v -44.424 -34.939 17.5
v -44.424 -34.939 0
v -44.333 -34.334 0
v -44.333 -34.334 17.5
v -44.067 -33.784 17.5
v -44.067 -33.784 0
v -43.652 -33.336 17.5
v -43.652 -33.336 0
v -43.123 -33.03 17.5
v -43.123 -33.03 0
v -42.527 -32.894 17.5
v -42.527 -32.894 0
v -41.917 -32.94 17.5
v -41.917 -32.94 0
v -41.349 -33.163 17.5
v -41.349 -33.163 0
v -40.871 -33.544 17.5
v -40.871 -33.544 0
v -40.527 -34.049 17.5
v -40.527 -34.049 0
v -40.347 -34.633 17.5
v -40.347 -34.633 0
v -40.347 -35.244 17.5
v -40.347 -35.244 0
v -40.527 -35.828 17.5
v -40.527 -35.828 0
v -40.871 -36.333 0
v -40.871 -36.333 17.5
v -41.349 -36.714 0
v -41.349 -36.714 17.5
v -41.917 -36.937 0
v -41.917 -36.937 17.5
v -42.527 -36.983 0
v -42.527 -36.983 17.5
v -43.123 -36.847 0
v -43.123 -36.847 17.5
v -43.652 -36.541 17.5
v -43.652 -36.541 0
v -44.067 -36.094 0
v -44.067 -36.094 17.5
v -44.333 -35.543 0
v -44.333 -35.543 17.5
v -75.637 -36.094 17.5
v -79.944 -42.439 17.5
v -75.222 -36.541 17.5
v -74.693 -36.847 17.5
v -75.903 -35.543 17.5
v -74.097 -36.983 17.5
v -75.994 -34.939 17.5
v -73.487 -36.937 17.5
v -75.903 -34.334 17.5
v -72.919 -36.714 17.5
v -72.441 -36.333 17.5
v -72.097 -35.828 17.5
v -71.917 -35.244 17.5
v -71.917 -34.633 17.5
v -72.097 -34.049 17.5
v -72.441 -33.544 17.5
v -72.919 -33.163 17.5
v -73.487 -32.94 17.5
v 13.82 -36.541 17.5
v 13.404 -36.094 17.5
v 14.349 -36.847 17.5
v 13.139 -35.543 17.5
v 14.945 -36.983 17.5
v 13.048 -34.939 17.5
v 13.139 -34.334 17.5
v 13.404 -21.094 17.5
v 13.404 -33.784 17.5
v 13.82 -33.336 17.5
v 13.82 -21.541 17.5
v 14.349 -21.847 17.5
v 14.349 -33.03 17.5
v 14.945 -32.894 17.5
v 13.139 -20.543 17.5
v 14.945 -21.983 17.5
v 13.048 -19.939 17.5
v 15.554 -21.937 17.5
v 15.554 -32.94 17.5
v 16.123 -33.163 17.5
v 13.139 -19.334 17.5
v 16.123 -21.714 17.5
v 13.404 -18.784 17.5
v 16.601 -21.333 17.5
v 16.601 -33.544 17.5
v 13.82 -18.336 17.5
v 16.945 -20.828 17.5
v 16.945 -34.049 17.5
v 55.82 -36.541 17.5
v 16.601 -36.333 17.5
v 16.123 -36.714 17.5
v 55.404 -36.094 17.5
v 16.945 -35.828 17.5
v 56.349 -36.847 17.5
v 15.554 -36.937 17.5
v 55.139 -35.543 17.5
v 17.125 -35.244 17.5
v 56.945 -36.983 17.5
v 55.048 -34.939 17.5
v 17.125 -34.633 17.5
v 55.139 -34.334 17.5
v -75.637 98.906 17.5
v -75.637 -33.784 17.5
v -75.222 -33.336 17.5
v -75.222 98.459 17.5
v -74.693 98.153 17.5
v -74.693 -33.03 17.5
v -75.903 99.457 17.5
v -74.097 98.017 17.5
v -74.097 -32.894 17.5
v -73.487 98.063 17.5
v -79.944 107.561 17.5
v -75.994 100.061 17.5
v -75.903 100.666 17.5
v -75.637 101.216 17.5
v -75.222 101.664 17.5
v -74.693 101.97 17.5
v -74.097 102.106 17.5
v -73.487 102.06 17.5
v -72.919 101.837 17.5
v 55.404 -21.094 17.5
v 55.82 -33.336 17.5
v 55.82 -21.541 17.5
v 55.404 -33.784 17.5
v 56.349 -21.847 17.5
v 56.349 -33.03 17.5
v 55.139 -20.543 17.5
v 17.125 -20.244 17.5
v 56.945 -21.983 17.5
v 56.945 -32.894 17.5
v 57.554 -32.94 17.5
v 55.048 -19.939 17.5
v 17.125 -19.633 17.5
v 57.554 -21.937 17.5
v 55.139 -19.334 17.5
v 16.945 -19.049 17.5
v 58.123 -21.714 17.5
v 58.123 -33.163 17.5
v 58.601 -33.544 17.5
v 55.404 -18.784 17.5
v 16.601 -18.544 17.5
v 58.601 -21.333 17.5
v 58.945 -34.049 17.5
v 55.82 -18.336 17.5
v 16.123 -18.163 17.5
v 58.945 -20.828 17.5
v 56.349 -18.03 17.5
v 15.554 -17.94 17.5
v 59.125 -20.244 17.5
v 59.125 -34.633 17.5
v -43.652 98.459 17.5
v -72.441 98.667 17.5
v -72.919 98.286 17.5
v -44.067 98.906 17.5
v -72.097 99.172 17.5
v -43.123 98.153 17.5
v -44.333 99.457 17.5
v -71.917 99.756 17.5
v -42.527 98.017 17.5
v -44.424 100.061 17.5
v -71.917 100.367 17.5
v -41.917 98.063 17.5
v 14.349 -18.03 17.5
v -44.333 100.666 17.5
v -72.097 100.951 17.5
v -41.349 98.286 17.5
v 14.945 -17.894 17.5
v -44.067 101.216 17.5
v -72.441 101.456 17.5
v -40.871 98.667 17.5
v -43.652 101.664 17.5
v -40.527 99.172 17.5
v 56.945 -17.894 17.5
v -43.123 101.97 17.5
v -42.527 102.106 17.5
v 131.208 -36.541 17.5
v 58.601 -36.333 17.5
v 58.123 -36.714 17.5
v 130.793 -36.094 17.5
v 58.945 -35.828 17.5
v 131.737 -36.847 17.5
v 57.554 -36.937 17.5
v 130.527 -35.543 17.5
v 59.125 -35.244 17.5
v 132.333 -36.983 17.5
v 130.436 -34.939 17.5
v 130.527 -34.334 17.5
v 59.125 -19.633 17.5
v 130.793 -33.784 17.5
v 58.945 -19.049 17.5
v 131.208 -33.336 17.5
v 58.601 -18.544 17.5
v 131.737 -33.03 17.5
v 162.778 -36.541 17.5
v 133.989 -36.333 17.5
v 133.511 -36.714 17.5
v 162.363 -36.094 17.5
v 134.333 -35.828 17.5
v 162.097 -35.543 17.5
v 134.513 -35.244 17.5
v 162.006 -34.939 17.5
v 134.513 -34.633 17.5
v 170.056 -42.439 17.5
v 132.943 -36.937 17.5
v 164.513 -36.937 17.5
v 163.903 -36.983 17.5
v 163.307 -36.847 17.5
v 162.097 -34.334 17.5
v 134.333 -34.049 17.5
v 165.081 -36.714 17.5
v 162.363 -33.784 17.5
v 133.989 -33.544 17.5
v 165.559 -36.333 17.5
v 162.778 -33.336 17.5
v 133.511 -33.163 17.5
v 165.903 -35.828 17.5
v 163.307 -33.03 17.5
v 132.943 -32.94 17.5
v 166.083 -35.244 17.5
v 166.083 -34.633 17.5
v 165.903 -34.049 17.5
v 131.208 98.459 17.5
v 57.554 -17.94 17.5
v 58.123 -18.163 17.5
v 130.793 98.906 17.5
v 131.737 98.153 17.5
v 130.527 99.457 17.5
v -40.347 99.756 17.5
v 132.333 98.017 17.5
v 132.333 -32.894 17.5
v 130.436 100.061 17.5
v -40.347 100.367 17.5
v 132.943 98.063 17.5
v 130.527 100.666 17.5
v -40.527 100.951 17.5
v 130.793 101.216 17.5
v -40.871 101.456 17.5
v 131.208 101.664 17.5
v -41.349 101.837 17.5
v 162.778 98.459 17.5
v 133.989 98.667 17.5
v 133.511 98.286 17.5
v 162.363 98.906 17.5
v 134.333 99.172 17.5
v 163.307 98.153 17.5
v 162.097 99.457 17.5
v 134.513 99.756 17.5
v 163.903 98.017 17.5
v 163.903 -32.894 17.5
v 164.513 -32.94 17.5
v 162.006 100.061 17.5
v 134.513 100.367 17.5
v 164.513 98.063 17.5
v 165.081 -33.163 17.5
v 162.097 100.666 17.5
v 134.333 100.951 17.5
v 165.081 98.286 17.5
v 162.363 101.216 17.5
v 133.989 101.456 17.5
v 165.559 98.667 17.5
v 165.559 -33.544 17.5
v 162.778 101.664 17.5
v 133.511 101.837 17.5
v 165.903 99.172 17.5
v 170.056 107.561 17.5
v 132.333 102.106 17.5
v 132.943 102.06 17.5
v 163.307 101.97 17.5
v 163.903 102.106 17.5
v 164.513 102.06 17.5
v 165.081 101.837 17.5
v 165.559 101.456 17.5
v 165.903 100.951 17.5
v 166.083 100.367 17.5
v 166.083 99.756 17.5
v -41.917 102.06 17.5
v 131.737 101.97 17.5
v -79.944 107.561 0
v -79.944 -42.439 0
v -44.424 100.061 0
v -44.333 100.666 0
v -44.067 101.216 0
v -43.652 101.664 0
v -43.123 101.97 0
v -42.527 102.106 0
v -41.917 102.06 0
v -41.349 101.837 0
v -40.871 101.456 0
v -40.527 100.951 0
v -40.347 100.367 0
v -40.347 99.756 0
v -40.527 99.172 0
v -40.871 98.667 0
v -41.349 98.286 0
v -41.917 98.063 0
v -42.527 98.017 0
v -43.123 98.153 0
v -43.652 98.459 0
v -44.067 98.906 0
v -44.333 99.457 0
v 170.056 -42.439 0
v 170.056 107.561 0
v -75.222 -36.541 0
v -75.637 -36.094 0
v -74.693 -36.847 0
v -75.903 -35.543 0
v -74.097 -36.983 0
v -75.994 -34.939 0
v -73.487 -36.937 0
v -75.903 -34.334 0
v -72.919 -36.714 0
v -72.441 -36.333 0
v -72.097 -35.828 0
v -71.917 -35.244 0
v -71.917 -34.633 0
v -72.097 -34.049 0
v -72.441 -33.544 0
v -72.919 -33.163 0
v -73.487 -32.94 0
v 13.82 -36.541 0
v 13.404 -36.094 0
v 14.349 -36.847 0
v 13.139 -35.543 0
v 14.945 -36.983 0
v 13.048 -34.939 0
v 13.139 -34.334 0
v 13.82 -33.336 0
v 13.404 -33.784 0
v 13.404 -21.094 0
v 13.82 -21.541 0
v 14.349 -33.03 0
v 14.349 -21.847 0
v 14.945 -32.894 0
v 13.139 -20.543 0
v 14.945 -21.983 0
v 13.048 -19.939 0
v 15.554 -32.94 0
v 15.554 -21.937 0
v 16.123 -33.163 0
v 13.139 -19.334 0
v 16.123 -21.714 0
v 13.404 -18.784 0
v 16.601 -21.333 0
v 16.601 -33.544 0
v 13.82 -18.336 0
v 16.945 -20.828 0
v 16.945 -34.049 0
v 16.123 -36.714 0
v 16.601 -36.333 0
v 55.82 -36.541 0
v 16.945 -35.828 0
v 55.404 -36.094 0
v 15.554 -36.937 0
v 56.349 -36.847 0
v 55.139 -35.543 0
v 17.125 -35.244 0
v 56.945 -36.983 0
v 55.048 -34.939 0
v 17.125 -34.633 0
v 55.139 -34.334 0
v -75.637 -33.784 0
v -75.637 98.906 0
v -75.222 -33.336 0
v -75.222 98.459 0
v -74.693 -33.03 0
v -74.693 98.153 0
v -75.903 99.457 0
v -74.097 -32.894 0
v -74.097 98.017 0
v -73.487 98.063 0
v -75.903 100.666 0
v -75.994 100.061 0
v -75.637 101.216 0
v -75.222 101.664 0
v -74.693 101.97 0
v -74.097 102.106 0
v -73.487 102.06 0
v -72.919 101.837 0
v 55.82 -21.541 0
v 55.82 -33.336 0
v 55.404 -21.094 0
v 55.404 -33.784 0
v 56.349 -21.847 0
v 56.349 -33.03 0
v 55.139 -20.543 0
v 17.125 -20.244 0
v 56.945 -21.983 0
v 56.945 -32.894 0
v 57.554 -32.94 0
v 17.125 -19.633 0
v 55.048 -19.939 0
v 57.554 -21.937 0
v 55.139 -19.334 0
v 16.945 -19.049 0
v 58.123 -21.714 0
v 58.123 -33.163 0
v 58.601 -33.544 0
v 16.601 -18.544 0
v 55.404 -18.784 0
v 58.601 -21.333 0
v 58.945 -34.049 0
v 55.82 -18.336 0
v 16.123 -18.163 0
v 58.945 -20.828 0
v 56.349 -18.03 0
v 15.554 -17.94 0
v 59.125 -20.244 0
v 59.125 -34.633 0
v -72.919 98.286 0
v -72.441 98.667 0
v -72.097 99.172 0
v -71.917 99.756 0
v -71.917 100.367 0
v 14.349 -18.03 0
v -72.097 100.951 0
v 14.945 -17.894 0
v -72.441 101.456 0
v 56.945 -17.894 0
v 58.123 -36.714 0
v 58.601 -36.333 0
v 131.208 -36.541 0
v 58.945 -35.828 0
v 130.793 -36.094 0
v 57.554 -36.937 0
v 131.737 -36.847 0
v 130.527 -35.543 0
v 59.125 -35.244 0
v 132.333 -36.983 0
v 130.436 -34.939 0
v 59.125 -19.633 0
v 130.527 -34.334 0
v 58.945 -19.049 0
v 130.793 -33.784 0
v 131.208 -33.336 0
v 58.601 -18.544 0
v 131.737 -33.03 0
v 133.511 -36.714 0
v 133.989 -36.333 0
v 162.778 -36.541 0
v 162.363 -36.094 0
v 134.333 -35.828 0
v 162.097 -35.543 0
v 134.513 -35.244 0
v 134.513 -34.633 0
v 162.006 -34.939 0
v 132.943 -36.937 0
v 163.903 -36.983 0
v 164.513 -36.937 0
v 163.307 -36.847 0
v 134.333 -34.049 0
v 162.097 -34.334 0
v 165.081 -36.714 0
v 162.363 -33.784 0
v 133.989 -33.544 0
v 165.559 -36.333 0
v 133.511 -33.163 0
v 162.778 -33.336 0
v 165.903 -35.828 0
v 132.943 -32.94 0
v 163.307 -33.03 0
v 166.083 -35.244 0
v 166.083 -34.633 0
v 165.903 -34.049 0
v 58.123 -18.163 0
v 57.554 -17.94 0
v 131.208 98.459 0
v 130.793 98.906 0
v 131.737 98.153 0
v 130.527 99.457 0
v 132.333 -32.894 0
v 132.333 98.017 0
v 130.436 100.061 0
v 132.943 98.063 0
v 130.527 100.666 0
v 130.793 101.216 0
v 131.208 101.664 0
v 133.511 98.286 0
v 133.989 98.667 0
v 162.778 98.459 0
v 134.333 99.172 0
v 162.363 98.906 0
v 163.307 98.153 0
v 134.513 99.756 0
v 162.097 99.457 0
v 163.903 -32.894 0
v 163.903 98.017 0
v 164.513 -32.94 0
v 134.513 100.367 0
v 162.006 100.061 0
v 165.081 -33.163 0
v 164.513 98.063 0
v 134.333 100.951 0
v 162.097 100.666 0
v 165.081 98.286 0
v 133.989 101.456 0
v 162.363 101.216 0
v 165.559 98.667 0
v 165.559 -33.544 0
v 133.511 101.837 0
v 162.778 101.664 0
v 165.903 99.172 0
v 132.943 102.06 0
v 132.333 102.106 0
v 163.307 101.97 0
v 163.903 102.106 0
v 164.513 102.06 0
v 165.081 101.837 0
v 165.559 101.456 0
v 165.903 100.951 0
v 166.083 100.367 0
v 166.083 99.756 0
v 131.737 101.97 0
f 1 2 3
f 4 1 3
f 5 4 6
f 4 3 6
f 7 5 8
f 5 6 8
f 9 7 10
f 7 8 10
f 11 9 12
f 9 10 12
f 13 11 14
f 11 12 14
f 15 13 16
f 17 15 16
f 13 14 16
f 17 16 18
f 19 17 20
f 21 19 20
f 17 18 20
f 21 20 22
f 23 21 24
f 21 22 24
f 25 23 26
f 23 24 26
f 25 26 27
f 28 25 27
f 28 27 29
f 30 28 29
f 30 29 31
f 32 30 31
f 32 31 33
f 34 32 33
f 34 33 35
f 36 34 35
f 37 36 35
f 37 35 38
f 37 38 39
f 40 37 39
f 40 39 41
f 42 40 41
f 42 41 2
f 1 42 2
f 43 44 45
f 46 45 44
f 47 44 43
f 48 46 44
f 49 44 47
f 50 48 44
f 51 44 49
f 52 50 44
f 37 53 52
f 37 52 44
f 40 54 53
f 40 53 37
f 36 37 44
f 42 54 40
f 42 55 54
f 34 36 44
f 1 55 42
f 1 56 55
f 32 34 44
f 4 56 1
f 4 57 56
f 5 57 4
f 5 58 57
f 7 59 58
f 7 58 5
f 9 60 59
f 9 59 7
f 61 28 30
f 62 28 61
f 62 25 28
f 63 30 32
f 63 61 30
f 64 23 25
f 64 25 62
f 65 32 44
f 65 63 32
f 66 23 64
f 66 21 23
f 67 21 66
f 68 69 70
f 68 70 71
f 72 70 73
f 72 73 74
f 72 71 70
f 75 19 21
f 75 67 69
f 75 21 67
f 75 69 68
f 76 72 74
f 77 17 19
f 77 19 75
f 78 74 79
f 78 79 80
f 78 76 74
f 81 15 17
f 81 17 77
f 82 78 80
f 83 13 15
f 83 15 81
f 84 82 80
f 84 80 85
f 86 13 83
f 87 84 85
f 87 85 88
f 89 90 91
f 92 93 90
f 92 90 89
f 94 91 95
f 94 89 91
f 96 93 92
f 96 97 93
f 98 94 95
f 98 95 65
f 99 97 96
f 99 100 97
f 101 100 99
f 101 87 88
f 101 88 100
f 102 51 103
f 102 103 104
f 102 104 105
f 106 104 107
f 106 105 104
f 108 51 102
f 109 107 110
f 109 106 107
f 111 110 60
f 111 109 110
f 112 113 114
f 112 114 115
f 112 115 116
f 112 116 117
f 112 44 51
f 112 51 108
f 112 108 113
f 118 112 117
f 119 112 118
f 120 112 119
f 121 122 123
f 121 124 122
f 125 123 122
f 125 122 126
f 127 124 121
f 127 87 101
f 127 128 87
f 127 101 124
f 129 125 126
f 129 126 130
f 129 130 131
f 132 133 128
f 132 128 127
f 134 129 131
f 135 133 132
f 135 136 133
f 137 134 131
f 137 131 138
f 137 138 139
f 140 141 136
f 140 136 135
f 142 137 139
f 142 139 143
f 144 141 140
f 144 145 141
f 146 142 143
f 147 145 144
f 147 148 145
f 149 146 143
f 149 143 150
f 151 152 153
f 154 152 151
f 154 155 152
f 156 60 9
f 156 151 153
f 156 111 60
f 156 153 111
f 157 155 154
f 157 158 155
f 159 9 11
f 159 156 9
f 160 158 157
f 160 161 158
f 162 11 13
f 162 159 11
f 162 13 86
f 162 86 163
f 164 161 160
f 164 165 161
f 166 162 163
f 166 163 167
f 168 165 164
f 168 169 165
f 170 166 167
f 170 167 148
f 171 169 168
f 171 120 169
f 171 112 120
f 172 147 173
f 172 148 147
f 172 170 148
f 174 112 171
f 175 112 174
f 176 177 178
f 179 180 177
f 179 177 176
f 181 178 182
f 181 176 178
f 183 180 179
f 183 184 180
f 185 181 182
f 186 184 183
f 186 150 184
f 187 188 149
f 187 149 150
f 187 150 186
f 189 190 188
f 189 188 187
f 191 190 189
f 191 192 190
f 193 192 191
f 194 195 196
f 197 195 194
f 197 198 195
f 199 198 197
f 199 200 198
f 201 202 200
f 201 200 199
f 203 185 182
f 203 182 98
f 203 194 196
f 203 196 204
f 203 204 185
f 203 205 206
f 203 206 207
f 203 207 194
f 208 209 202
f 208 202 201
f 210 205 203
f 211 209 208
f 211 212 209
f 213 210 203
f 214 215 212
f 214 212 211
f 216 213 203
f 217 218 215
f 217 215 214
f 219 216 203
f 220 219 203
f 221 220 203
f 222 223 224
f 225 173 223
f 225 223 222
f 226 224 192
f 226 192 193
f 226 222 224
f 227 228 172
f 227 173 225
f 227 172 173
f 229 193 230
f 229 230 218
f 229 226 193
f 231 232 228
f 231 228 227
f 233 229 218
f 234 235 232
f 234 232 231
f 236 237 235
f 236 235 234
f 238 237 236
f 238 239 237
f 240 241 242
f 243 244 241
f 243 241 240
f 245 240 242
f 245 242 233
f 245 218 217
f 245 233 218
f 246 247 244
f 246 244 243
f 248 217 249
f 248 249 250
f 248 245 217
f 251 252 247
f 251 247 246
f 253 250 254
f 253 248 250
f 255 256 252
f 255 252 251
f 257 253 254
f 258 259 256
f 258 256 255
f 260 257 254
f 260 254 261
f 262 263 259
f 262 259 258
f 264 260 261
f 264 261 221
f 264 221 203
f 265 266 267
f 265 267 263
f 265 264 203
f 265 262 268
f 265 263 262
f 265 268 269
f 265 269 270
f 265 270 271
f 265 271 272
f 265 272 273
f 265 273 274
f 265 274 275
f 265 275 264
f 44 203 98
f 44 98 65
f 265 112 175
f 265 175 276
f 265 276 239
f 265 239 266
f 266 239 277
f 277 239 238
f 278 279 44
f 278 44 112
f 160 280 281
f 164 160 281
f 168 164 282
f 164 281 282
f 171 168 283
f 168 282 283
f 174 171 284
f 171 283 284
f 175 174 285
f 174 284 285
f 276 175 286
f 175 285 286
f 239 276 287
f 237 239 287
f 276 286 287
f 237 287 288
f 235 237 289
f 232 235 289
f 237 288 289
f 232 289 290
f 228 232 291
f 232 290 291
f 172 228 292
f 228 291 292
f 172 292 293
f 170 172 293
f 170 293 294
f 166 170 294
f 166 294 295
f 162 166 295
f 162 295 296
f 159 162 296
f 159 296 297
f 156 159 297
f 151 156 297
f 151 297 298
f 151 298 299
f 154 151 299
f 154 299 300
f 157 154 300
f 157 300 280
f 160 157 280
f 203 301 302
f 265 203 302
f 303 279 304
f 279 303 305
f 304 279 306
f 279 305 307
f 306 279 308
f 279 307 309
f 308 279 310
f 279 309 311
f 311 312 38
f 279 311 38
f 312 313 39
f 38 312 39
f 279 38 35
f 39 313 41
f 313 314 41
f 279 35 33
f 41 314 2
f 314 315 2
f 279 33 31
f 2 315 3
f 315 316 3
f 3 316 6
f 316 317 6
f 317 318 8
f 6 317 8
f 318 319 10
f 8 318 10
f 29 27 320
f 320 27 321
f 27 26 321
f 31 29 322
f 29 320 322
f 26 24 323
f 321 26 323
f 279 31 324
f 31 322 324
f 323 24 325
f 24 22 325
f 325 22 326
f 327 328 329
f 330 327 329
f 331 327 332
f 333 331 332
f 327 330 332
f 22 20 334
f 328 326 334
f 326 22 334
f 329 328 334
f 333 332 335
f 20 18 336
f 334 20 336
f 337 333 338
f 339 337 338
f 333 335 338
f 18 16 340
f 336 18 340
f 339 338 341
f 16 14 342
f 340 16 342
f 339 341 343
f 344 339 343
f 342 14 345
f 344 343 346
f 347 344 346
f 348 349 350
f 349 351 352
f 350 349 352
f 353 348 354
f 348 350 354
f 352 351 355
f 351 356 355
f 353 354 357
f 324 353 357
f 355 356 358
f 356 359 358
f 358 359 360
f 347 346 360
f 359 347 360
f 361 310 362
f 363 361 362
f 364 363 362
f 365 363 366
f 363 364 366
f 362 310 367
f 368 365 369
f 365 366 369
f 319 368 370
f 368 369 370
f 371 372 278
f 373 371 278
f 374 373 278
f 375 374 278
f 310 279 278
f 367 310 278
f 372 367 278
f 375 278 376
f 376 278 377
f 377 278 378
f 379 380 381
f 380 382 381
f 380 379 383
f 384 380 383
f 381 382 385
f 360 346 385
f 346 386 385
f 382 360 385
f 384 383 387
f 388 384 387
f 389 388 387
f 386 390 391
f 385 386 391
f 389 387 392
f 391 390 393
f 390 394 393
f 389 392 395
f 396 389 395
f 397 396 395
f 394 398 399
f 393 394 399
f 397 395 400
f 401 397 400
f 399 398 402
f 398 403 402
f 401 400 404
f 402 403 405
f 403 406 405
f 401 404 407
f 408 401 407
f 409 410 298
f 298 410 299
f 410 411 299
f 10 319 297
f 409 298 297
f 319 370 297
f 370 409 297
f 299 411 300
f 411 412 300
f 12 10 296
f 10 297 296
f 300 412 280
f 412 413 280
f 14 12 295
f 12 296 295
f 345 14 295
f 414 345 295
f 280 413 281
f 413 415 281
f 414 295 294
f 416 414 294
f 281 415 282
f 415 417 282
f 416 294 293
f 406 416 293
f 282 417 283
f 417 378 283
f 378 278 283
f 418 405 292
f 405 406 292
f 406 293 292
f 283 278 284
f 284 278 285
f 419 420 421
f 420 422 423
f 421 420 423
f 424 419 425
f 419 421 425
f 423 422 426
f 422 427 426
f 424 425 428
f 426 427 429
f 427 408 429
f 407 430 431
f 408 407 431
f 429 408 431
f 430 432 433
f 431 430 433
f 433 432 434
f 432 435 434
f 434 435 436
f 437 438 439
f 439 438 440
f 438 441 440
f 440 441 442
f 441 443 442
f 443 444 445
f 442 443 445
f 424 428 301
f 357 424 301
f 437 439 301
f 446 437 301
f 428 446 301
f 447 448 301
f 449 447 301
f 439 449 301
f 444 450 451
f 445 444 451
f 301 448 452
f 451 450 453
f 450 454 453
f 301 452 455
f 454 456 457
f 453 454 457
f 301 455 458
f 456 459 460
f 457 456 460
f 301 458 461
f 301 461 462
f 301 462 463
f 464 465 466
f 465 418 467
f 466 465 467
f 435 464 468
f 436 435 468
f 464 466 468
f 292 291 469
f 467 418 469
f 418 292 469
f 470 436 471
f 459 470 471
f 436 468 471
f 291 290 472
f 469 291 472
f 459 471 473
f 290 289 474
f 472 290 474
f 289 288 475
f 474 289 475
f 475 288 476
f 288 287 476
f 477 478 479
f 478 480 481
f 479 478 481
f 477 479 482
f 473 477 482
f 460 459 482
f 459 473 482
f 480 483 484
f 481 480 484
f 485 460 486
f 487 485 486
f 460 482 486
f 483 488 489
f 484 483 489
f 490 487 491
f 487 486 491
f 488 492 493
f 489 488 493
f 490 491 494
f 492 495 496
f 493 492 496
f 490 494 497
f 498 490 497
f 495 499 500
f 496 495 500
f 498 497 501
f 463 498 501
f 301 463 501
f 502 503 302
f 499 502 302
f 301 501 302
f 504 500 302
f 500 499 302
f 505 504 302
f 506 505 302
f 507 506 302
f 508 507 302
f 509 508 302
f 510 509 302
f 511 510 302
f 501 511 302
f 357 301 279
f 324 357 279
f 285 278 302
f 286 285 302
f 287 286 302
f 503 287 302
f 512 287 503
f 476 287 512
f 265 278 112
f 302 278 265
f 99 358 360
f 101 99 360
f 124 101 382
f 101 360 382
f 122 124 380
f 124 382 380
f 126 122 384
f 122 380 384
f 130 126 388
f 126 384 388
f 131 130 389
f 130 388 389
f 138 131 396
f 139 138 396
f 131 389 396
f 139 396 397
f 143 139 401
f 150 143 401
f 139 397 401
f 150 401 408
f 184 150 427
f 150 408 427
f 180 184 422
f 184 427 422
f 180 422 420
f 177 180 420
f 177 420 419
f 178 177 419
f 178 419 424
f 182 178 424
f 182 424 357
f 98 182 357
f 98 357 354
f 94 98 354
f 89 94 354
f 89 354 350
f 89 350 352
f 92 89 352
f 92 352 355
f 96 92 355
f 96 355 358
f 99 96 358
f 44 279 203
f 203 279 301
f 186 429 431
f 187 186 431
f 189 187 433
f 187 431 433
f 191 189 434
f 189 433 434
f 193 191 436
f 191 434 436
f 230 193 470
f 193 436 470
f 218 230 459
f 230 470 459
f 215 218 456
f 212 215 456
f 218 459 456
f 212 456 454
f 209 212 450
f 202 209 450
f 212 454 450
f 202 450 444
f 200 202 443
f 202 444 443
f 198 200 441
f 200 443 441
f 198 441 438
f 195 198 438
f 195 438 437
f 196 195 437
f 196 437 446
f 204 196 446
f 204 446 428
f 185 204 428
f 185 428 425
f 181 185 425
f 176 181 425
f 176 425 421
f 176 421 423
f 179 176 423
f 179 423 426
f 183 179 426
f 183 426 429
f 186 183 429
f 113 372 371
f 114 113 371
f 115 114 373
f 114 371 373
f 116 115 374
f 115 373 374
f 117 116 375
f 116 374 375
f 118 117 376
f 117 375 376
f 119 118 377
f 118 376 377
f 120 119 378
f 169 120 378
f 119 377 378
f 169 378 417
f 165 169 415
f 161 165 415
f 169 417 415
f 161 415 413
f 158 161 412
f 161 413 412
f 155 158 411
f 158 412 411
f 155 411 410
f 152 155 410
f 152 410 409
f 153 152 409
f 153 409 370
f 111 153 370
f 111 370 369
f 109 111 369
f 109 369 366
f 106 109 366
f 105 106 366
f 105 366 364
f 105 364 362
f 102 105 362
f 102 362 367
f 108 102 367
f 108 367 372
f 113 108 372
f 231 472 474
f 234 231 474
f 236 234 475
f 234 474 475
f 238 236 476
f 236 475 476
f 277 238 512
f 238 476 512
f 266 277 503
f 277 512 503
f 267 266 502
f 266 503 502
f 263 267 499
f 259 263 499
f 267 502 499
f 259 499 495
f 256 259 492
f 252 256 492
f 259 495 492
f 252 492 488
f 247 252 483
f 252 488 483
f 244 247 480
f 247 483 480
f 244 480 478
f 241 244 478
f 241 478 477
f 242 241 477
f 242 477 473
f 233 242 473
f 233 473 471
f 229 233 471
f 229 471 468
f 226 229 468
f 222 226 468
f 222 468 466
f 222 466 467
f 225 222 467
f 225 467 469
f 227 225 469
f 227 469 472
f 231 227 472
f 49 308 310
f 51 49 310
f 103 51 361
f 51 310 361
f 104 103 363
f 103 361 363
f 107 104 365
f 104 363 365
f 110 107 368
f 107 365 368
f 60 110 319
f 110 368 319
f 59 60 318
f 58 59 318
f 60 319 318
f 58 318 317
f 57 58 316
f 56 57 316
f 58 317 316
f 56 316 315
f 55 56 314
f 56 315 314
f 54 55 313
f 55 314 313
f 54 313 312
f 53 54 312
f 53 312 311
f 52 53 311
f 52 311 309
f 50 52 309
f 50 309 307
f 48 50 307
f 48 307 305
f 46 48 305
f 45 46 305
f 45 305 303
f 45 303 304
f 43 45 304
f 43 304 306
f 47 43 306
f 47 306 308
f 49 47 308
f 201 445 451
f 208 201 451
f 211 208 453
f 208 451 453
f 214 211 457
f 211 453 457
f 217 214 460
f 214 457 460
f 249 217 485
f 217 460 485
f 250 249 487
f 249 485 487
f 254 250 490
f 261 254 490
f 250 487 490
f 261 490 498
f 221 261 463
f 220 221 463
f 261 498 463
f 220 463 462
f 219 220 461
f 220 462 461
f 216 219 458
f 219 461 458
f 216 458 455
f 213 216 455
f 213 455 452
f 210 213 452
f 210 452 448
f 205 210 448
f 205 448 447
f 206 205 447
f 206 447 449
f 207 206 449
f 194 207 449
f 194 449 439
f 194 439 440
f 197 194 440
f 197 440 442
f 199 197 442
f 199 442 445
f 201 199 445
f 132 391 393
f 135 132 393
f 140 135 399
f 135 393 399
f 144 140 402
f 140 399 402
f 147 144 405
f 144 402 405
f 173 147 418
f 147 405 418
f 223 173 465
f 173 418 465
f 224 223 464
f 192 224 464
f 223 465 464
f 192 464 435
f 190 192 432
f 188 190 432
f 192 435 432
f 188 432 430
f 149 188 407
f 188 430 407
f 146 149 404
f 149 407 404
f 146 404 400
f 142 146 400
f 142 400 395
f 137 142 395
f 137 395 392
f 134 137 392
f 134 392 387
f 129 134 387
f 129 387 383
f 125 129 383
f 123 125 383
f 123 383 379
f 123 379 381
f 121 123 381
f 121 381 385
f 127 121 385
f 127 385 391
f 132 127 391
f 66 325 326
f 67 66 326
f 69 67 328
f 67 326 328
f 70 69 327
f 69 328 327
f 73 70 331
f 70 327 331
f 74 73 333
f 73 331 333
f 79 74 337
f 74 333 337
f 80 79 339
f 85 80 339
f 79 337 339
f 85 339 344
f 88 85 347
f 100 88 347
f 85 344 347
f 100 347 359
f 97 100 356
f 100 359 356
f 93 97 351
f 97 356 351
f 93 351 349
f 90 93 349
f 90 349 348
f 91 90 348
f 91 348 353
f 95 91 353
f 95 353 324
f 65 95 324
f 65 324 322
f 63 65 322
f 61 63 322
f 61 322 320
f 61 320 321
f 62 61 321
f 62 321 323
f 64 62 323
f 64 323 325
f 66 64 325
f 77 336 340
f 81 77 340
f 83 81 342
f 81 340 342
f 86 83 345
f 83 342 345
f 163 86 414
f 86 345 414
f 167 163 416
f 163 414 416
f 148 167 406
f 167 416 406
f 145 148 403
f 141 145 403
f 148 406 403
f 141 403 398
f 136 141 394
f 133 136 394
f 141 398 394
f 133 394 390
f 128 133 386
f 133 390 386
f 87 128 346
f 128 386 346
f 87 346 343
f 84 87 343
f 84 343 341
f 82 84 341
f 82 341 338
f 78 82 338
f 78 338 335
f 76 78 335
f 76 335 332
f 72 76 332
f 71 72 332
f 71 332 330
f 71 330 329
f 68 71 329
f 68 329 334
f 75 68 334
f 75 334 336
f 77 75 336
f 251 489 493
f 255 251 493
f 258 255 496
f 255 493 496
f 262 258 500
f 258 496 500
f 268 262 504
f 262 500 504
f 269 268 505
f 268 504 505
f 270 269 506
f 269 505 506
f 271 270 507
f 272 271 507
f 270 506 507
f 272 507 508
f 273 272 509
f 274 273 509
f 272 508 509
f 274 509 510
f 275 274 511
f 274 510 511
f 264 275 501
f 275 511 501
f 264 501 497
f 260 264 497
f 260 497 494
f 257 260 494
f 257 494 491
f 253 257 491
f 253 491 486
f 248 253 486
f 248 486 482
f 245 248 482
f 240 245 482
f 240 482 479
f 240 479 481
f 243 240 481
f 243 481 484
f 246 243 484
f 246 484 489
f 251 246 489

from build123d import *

# Parameters (mm, degrees)
F0_W     = 250
F0_H     = 150
F1_DEPTH = 17.5
F3_D     = 4.1


# Not quite as in the source:
# - the program builds the solid bodies; features that only make, move or delete a surface that nothing else refers to are left out


with BuildPart() as f1:
    # F0 (on Top) → F1 (new body)
    with BuildSketch(Plane.XY):
        with Locations((45.0563491821, 32.5613047183)):
            Rectangle(F0_W, F0_H)
    extrude(amount=F1_DEPTH)

    # F3 (through all)
    with Locations(Plane.XY.offset(17.5)):
        with Locations((-73.9436508179, 100.0613047183), (-42.3736508179, 100.0613047183), (132.4863491821, 100.0613047183), (164.0563491821, 100.0613047183), (164.0563491821, -34.9386952817), (132.4863491821, -34.9386952817), (57.0981395915, -19.9386952817), (57.0981395915, -34.9386952817), (15.0981395915, -19.9386952817), (15.0981395915, -34.9386952817), (-42.3736508179, -34.9386952817), (-73.9436508179, -34.9386952817)):
            Hole(F3_D / 2)


solid = f1.part
